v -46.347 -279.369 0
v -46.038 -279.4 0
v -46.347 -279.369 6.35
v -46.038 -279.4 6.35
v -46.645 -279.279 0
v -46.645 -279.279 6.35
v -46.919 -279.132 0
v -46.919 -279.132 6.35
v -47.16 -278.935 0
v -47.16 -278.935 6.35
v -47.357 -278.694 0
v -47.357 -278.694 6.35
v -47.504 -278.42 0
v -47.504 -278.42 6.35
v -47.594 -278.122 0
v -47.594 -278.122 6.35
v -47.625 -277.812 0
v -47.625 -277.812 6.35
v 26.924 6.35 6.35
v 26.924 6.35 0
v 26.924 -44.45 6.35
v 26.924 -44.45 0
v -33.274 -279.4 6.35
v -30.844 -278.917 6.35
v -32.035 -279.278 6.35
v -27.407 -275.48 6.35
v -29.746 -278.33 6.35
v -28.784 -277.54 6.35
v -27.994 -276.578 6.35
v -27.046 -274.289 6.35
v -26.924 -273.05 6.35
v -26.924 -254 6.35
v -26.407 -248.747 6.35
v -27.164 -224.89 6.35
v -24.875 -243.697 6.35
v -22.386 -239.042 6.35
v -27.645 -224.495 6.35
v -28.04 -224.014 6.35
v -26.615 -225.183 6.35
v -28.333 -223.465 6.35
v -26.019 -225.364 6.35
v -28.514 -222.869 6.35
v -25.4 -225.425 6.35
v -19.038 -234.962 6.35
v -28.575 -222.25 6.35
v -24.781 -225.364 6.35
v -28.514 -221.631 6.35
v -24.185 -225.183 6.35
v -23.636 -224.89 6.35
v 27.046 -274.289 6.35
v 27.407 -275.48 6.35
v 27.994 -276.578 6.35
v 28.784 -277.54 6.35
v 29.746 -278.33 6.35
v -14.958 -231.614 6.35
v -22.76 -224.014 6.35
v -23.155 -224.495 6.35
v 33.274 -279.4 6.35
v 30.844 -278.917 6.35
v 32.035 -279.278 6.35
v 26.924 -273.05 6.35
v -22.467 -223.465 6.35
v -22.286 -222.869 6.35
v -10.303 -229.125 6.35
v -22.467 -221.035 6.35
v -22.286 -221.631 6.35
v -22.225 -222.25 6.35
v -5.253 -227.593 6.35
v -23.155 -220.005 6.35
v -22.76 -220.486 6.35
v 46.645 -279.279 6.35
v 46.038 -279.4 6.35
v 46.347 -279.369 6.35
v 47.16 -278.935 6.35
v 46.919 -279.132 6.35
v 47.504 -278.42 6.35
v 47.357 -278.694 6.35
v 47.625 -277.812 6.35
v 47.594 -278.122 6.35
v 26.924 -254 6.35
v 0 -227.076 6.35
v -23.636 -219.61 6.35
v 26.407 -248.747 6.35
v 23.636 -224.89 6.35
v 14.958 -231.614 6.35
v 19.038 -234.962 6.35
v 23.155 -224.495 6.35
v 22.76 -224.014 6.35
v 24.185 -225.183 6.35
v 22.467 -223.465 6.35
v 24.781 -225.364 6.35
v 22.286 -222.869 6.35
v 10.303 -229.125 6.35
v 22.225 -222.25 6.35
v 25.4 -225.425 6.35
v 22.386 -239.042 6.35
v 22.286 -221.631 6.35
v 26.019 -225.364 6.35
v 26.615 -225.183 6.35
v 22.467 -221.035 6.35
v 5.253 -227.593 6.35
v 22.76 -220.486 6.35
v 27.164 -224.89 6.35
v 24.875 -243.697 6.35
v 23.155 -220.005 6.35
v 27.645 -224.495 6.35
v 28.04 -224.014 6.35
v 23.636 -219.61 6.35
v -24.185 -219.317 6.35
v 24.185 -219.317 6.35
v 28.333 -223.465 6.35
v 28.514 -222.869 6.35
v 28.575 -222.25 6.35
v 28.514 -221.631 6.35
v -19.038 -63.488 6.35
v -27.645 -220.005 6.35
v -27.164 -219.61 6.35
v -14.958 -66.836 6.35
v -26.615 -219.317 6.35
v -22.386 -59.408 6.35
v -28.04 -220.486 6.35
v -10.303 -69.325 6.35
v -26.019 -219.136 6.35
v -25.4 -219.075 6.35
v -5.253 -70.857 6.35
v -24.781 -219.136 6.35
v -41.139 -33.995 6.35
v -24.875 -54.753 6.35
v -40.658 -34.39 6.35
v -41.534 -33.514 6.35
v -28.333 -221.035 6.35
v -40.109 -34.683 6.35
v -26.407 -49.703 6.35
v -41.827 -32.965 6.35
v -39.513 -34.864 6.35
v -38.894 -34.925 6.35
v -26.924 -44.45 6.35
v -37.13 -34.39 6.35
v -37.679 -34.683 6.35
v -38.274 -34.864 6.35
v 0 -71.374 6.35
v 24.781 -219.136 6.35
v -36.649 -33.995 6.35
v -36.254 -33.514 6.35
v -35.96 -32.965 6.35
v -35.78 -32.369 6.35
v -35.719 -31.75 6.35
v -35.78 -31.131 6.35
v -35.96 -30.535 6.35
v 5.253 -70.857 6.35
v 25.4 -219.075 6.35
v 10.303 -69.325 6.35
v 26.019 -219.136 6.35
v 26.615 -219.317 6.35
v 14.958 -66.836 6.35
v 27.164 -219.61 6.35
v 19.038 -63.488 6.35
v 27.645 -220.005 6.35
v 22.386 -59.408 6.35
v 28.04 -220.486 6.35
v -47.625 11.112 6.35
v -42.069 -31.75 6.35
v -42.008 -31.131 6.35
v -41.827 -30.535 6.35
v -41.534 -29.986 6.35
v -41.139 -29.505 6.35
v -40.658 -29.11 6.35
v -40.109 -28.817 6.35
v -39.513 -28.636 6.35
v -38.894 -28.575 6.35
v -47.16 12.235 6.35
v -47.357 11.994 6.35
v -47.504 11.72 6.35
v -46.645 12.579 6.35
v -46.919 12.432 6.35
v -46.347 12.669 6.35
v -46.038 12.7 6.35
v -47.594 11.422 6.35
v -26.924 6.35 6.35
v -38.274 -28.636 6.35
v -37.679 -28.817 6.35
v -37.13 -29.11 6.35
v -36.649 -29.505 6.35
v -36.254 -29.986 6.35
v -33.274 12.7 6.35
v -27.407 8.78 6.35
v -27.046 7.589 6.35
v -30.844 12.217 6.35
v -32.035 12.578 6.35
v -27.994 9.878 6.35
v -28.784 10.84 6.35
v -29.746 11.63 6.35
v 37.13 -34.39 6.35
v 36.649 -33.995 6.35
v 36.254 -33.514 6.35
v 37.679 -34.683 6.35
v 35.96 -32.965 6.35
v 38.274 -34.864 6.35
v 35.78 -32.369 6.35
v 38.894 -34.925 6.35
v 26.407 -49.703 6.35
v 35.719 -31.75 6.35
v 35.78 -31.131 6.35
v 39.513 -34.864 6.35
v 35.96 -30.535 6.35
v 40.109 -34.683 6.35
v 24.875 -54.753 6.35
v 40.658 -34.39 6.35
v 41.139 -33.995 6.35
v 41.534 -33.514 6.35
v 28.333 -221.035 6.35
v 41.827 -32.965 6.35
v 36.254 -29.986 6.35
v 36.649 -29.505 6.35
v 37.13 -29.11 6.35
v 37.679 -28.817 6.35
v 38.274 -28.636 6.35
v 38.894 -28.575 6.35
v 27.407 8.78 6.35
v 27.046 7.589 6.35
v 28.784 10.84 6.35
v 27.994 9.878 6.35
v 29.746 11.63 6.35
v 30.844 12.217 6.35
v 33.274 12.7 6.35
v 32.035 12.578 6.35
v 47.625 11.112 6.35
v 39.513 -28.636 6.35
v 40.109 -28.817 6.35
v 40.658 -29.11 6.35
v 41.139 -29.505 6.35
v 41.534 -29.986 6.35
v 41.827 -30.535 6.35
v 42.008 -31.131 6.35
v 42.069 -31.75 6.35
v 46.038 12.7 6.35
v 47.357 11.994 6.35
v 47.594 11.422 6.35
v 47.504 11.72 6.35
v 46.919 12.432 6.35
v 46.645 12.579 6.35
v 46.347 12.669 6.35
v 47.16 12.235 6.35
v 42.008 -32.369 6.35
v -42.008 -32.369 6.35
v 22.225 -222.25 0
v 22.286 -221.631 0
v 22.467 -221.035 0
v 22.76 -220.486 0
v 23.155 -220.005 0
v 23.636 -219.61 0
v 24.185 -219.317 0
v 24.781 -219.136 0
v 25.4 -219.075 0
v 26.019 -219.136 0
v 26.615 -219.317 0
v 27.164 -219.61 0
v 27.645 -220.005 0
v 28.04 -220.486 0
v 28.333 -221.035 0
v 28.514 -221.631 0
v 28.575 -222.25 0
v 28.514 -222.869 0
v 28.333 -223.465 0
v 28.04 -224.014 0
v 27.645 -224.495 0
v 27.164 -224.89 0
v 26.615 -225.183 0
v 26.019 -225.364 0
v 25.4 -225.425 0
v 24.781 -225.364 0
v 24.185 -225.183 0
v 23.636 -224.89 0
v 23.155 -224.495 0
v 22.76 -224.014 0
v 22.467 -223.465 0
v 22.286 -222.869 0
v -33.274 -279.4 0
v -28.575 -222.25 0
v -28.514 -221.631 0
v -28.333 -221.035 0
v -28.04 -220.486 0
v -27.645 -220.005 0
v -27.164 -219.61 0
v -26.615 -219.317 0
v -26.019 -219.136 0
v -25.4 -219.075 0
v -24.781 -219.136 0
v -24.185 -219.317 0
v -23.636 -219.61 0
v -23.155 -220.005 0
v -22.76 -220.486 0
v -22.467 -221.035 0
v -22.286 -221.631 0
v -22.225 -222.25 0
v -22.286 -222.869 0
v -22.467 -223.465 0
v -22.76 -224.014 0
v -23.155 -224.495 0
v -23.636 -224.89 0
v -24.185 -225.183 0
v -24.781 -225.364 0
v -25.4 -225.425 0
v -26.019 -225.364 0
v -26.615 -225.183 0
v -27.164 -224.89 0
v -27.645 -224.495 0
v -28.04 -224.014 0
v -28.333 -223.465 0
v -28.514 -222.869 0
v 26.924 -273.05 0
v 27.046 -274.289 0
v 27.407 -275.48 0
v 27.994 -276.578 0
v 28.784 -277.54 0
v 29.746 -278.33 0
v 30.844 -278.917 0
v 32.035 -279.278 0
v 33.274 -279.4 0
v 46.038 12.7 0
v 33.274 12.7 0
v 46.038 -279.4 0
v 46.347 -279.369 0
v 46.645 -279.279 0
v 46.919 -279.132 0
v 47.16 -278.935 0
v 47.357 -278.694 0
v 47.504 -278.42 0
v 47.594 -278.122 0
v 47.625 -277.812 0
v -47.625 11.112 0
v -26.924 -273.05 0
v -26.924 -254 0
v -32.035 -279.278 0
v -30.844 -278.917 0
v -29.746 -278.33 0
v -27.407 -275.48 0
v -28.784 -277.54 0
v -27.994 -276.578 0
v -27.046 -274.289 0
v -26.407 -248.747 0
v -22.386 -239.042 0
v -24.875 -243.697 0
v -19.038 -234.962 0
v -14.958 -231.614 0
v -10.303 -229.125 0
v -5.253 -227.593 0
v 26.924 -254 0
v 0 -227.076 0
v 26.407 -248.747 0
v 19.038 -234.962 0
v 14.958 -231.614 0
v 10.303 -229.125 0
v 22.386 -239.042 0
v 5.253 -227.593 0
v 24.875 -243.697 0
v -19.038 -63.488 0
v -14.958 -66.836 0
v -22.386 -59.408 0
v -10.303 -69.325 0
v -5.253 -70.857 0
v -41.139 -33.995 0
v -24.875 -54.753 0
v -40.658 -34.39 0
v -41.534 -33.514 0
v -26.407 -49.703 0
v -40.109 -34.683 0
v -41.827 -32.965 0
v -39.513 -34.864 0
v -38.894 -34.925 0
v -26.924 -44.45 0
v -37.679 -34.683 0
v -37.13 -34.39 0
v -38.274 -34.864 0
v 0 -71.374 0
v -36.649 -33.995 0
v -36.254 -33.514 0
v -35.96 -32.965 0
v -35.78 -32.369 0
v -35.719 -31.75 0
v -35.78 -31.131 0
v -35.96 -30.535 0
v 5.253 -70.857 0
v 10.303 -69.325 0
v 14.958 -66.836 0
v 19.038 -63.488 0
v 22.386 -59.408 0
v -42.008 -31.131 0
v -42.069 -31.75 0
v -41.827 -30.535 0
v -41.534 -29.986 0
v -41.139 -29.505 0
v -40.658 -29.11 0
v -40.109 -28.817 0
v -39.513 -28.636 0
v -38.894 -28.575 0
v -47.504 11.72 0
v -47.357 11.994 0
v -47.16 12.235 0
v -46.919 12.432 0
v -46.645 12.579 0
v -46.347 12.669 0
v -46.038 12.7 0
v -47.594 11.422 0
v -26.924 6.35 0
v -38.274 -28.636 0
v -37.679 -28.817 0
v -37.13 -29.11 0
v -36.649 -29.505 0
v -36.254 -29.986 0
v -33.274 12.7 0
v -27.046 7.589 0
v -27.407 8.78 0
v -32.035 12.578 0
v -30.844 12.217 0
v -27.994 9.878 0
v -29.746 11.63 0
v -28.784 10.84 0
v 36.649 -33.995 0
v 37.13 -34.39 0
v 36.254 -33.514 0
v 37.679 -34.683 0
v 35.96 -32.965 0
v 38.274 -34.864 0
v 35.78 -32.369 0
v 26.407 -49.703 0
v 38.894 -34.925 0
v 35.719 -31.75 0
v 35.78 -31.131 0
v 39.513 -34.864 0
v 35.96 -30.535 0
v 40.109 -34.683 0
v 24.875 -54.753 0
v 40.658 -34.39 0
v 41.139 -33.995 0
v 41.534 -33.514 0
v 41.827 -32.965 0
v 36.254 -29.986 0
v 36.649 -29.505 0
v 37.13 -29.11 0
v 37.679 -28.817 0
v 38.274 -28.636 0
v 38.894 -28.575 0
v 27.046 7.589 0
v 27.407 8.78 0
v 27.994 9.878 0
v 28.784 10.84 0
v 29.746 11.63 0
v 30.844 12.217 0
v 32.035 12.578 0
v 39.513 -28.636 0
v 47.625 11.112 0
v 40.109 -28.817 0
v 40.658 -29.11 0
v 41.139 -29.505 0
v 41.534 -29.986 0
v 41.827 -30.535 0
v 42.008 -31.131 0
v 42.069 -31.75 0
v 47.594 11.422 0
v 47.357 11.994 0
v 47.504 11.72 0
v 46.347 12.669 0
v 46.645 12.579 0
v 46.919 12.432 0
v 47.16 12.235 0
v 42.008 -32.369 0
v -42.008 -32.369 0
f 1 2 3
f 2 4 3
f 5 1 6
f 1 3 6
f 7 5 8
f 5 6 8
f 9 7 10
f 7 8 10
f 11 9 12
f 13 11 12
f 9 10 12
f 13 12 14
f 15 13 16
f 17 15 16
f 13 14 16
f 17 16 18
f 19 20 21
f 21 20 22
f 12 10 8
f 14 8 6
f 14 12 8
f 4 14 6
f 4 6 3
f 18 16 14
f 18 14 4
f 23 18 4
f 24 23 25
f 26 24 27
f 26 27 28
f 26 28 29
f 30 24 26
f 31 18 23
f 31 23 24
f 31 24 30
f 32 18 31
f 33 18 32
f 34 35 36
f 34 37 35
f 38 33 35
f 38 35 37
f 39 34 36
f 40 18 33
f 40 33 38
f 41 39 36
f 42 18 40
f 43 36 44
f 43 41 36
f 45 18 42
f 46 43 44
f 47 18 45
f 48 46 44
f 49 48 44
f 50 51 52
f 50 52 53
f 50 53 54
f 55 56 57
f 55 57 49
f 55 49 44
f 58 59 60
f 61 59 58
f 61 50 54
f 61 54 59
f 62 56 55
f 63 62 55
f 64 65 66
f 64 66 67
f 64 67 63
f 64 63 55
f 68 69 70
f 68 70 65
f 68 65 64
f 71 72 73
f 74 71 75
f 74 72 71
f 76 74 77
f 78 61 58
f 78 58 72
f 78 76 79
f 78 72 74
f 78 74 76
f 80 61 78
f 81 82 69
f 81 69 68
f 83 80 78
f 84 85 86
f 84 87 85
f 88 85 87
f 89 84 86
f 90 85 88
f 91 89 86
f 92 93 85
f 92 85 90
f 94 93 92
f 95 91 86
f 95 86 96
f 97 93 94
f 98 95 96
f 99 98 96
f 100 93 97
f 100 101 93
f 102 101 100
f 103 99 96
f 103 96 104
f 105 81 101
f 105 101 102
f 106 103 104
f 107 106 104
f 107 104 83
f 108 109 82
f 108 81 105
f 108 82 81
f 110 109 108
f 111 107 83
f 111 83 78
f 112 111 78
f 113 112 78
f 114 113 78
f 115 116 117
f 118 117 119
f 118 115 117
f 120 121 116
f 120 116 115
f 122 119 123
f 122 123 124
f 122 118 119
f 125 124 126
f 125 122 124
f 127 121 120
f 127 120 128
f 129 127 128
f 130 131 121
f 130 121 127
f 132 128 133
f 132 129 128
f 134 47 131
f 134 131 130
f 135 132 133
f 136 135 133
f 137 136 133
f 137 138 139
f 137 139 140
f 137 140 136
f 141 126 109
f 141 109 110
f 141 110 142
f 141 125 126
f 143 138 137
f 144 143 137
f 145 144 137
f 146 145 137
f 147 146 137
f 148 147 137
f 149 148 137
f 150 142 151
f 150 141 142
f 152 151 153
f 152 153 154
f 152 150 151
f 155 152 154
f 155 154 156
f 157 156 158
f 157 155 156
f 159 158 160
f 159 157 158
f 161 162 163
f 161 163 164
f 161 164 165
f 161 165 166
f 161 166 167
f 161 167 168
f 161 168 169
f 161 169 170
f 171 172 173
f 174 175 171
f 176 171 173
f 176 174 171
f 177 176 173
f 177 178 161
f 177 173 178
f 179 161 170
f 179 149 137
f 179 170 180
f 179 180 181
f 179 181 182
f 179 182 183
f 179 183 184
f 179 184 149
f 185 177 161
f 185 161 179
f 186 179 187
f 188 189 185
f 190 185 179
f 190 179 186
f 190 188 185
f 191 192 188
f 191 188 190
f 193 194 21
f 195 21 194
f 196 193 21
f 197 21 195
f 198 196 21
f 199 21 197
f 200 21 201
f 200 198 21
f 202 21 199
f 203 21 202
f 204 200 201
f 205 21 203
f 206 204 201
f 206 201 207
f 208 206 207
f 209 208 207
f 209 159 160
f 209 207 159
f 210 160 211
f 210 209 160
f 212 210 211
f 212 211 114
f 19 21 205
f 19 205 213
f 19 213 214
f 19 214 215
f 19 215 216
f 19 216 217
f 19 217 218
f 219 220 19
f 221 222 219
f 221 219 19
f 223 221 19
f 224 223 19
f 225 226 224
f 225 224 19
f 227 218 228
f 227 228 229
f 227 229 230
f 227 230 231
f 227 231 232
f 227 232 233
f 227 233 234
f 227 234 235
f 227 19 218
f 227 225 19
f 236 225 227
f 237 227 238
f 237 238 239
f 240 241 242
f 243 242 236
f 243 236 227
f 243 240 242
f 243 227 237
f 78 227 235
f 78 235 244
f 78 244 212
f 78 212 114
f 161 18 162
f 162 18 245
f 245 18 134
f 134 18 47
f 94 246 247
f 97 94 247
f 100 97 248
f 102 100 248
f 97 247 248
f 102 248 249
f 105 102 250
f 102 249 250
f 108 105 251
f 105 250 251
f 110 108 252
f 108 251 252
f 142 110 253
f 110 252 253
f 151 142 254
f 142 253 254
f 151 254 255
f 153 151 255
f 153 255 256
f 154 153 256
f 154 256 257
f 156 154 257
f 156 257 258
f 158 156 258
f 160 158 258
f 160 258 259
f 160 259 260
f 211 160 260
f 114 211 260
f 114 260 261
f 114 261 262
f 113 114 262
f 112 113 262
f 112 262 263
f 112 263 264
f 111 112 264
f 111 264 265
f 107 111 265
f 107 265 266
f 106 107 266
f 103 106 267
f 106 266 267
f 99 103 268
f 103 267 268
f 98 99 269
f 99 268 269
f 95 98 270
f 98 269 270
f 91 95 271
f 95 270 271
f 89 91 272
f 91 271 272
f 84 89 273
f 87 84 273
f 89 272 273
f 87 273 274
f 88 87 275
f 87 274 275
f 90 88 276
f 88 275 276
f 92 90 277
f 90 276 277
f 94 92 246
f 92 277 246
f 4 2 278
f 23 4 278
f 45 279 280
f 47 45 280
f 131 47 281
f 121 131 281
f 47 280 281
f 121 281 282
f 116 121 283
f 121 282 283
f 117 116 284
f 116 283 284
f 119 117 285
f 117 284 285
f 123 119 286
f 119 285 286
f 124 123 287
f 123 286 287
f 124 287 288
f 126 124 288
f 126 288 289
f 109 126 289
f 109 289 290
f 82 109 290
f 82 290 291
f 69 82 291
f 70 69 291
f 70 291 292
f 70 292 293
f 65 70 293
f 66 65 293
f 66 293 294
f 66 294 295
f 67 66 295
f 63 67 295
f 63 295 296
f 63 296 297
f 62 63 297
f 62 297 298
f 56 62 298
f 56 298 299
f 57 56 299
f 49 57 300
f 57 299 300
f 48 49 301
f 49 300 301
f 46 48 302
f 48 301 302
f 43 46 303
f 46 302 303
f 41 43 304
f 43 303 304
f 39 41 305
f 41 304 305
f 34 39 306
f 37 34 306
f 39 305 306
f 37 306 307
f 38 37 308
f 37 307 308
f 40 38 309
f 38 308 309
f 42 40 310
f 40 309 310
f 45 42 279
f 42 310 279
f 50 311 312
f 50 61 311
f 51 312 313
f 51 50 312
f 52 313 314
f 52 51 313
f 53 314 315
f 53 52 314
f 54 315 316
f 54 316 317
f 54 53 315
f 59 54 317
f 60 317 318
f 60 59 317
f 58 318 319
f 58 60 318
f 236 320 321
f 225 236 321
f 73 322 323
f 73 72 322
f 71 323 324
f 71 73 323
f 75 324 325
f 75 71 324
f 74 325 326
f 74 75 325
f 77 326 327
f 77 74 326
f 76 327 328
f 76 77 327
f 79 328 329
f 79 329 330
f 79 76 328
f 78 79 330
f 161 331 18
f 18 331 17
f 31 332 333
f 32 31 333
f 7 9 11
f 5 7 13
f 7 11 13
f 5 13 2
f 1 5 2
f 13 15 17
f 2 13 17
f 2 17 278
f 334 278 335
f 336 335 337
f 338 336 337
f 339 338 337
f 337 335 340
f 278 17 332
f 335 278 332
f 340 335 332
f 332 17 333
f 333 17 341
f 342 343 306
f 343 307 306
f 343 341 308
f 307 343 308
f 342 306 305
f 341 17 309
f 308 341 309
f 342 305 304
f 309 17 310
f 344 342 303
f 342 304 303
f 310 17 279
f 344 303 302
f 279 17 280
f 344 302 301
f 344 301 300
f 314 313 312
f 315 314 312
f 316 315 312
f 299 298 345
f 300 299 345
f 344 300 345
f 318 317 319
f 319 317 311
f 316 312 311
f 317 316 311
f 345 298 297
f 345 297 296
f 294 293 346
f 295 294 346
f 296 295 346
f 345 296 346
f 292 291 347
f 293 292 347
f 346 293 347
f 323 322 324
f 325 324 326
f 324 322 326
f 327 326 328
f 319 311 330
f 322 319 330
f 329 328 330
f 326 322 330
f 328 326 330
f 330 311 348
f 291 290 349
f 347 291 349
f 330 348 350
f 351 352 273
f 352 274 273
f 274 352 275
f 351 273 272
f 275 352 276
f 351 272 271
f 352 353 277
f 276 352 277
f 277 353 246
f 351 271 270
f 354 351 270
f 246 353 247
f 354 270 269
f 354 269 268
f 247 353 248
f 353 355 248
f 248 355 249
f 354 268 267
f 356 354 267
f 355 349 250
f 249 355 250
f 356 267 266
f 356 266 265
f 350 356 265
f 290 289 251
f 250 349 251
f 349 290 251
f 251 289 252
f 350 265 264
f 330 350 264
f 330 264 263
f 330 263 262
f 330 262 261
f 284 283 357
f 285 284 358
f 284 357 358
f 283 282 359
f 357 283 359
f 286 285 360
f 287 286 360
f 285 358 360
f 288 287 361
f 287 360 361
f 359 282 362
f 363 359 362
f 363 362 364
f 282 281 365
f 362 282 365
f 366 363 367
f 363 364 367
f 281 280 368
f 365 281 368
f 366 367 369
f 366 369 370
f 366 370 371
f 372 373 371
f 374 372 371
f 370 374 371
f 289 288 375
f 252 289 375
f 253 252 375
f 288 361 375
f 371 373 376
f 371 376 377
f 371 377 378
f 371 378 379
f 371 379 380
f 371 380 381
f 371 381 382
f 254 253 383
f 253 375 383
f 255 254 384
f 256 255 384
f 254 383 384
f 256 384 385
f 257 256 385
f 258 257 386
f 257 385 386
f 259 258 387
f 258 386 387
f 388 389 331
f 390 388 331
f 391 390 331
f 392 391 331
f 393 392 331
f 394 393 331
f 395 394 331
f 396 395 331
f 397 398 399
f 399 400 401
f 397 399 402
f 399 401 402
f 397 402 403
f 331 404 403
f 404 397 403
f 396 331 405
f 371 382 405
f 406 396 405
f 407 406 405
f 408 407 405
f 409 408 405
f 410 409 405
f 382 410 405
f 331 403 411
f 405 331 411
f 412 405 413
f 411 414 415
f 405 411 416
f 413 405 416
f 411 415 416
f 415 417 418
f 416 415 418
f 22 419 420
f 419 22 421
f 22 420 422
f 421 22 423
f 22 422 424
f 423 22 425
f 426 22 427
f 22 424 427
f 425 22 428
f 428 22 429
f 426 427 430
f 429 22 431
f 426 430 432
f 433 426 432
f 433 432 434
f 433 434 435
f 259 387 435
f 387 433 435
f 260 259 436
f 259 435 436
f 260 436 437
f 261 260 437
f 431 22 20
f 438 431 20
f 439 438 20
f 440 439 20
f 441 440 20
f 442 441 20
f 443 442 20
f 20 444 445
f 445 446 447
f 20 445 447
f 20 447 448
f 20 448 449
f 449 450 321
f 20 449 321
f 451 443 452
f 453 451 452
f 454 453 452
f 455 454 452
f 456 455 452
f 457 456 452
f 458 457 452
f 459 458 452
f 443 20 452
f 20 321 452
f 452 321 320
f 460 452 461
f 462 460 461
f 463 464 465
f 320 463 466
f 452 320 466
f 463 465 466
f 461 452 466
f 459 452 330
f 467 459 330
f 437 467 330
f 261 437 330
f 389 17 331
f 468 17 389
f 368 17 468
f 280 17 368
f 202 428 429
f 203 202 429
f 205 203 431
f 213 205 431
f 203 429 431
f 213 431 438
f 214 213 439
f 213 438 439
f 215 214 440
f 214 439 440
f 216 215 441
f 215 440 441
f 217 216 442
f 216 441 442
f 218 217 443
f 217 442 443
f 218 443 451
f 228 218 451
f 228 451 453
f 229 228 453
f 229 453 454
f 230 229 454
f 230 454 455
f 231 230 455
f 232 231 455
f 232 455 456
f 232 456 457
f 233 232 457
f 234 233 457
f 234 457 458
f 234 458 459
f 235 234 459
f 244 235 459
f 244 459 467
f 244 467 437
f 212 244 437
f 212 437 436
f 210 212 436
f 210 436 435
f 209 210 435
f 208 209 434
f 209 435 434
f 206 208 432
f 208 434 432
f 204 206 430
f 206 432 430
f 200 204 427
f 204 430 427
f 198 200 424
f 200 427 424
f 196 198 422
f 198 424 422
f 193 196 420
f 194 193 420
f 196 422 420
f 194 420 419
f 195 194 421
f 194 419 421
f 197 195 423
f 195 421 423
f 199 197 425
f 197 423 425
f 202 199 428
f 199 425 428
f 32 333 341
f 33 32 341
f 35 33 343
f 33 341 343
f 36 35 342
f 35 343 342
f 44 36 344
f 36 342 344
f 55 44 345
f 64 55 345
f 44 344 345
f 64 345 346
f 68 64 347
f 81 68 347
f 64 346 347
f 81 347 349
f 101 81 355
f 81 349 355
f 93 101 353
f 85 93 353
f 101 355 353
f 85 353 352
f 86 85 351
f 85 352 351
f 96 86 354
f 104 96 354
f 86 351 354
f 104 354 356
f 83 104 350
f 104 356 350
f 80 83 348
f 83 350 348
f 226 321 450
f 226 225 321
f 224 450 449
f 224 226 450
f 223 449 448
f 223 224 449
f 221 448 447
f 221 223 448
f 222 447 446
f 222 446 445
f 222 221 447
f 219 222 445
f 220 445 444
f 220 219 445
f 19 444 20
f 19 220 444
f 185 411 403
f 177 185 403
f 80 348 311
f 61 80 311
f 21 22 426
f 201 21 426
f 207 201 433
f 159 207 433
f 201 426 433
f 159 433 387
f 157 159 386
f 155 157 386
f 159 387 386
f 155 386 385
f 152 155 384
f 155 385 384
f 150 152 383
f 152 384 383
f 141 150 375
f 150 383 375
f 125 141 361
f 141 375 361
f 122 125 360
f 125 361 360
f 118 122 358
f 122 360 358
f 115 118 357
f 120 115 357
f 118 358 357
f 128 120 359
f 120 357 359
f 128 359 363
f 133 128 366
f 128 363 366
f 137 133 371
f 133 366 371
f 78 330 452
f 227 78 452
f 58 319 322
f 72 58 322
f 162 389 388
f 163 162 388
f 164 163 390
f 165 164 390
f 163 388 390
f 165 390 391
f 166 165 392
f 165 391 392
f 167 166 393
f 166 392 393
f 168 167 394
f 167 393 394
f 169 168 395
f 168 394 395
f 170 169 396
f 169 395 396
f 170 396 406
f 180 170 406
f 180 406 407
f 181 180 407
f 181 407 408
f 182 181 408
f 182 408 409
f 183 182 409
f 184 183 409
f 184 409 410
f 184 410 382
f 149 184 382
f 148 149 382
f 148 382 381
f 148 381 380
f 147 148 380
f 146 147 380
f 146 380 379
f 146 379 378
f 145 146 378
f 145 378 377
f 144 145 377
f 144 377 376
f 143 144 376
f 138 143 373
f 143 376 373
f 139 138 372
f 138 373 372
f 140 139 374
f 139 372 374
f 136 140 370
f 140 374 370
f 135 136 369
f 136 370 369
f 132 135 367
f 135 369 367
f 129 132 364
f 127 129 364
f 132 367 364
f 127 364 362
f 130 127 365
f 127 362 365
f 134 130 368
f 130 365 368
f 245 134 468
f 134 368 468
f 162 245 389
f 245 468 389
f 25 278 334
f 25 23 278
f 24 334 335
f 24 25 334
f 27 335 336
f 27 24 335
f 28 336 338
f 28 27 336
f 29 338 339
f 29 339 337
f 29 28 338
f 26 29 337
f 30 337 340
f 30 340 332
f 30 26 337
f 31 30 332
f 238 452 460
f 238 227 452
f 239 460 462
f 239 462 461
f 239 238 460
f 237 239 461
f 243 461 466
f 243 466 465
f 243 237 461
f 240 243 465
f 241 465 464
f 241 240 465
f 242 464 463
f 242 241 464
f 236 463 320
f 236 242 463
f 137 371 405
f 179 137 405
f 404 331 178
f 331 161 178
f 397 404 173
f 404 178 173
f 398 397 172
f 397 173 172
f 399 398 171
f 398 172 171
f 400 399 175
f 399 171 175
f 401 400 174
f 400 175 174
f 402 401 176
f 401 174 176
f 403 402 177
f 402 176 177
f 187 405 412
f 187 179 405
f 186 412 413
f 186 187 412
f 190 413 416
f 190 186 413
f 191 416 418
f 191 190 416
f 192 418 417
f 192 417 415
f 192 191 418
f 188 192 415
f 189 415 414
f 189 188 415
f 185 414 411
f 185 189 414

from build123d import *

# Parameters (mm, degrees)
BOSS_EXTRUDE1_DEPTH         = 6.35
FILLET1_R                   = 6.35
FILLET2_R                   = 1.5875
F_1_4_0_25_DIAMETER_HOLE1_D = 6.35


with BuildPart() as part:
    # Sketch2 → Boss-Extrude1 (new body)
    with BuildSketch(Plane.XY):
        with BuildLine():
            Line((-47.625, -279.4), (-26.924, -279.4))
            Line((-26.924, -279.4), (-26.924, -254))
            ThreePointArc((-26.924, -254), (0, -227.076), (26.924, -254))
            Line((26.924, -254), (26.924, -279.4))
            Line((26.924, -279.4), (47.625, -279.4))
            Line((47.625, -279.4), (47.625, 12.7))
            Line((47.625, 12.7), (26.924, 12.7))
            Line((26.924, 12.7), (26.924, -44.45))
            ThreePointArc((26.924, -44.45), (0, -71.374), (-26.924, -44.45))
            Line((-26.924, -44.45), (-26.924, 12.7))
            Line((-26.924, 12.7), (-47.625, 12.7))
            Line((-47.625, 12.7), (-47.625, -279.4))
        make_face()
    extrude(amount=BOSS_EXTRUDE1_DEPTH)

    # Fillet1
    fillet1_edges = [part.edges().sort_by_distance(p)[0] for p in [
        (-26.924, 12.7, 3.175),
        (26.924, 12.7, 3.175),
        (26.924, -279.4, 3.175),
        (-26.924, -279.4, 3.175),
    ]]
    fillet(fillet1_edges, radius=FILLET1_R)

    # Fillet2
    fillet2_edges = [part.edges().sort_by_distance(p)[0] for p in [
        (-47.625, 12.7, 3.175),
        (47.625, 12.7, 3.175),
        (47.625, -279.4, 3.175),
        (-47.625, -279.4, 3.175),
    ]]
    fillet(fillet2_edges, radius=FILLET2_R)

    # 1/4 (0.25) Diameter Hole1 (through all)
    with Locations(Plane.XY.offset(6.35)):
        with Locations((-25.4, -222.25), (-38.89375, -31.75), (38.89375, -31.75), (25.4, -222.25)):
            Hole(F_1_4_0_25_DIAMETER_HOLE1_D / 2)


solid = part.part
